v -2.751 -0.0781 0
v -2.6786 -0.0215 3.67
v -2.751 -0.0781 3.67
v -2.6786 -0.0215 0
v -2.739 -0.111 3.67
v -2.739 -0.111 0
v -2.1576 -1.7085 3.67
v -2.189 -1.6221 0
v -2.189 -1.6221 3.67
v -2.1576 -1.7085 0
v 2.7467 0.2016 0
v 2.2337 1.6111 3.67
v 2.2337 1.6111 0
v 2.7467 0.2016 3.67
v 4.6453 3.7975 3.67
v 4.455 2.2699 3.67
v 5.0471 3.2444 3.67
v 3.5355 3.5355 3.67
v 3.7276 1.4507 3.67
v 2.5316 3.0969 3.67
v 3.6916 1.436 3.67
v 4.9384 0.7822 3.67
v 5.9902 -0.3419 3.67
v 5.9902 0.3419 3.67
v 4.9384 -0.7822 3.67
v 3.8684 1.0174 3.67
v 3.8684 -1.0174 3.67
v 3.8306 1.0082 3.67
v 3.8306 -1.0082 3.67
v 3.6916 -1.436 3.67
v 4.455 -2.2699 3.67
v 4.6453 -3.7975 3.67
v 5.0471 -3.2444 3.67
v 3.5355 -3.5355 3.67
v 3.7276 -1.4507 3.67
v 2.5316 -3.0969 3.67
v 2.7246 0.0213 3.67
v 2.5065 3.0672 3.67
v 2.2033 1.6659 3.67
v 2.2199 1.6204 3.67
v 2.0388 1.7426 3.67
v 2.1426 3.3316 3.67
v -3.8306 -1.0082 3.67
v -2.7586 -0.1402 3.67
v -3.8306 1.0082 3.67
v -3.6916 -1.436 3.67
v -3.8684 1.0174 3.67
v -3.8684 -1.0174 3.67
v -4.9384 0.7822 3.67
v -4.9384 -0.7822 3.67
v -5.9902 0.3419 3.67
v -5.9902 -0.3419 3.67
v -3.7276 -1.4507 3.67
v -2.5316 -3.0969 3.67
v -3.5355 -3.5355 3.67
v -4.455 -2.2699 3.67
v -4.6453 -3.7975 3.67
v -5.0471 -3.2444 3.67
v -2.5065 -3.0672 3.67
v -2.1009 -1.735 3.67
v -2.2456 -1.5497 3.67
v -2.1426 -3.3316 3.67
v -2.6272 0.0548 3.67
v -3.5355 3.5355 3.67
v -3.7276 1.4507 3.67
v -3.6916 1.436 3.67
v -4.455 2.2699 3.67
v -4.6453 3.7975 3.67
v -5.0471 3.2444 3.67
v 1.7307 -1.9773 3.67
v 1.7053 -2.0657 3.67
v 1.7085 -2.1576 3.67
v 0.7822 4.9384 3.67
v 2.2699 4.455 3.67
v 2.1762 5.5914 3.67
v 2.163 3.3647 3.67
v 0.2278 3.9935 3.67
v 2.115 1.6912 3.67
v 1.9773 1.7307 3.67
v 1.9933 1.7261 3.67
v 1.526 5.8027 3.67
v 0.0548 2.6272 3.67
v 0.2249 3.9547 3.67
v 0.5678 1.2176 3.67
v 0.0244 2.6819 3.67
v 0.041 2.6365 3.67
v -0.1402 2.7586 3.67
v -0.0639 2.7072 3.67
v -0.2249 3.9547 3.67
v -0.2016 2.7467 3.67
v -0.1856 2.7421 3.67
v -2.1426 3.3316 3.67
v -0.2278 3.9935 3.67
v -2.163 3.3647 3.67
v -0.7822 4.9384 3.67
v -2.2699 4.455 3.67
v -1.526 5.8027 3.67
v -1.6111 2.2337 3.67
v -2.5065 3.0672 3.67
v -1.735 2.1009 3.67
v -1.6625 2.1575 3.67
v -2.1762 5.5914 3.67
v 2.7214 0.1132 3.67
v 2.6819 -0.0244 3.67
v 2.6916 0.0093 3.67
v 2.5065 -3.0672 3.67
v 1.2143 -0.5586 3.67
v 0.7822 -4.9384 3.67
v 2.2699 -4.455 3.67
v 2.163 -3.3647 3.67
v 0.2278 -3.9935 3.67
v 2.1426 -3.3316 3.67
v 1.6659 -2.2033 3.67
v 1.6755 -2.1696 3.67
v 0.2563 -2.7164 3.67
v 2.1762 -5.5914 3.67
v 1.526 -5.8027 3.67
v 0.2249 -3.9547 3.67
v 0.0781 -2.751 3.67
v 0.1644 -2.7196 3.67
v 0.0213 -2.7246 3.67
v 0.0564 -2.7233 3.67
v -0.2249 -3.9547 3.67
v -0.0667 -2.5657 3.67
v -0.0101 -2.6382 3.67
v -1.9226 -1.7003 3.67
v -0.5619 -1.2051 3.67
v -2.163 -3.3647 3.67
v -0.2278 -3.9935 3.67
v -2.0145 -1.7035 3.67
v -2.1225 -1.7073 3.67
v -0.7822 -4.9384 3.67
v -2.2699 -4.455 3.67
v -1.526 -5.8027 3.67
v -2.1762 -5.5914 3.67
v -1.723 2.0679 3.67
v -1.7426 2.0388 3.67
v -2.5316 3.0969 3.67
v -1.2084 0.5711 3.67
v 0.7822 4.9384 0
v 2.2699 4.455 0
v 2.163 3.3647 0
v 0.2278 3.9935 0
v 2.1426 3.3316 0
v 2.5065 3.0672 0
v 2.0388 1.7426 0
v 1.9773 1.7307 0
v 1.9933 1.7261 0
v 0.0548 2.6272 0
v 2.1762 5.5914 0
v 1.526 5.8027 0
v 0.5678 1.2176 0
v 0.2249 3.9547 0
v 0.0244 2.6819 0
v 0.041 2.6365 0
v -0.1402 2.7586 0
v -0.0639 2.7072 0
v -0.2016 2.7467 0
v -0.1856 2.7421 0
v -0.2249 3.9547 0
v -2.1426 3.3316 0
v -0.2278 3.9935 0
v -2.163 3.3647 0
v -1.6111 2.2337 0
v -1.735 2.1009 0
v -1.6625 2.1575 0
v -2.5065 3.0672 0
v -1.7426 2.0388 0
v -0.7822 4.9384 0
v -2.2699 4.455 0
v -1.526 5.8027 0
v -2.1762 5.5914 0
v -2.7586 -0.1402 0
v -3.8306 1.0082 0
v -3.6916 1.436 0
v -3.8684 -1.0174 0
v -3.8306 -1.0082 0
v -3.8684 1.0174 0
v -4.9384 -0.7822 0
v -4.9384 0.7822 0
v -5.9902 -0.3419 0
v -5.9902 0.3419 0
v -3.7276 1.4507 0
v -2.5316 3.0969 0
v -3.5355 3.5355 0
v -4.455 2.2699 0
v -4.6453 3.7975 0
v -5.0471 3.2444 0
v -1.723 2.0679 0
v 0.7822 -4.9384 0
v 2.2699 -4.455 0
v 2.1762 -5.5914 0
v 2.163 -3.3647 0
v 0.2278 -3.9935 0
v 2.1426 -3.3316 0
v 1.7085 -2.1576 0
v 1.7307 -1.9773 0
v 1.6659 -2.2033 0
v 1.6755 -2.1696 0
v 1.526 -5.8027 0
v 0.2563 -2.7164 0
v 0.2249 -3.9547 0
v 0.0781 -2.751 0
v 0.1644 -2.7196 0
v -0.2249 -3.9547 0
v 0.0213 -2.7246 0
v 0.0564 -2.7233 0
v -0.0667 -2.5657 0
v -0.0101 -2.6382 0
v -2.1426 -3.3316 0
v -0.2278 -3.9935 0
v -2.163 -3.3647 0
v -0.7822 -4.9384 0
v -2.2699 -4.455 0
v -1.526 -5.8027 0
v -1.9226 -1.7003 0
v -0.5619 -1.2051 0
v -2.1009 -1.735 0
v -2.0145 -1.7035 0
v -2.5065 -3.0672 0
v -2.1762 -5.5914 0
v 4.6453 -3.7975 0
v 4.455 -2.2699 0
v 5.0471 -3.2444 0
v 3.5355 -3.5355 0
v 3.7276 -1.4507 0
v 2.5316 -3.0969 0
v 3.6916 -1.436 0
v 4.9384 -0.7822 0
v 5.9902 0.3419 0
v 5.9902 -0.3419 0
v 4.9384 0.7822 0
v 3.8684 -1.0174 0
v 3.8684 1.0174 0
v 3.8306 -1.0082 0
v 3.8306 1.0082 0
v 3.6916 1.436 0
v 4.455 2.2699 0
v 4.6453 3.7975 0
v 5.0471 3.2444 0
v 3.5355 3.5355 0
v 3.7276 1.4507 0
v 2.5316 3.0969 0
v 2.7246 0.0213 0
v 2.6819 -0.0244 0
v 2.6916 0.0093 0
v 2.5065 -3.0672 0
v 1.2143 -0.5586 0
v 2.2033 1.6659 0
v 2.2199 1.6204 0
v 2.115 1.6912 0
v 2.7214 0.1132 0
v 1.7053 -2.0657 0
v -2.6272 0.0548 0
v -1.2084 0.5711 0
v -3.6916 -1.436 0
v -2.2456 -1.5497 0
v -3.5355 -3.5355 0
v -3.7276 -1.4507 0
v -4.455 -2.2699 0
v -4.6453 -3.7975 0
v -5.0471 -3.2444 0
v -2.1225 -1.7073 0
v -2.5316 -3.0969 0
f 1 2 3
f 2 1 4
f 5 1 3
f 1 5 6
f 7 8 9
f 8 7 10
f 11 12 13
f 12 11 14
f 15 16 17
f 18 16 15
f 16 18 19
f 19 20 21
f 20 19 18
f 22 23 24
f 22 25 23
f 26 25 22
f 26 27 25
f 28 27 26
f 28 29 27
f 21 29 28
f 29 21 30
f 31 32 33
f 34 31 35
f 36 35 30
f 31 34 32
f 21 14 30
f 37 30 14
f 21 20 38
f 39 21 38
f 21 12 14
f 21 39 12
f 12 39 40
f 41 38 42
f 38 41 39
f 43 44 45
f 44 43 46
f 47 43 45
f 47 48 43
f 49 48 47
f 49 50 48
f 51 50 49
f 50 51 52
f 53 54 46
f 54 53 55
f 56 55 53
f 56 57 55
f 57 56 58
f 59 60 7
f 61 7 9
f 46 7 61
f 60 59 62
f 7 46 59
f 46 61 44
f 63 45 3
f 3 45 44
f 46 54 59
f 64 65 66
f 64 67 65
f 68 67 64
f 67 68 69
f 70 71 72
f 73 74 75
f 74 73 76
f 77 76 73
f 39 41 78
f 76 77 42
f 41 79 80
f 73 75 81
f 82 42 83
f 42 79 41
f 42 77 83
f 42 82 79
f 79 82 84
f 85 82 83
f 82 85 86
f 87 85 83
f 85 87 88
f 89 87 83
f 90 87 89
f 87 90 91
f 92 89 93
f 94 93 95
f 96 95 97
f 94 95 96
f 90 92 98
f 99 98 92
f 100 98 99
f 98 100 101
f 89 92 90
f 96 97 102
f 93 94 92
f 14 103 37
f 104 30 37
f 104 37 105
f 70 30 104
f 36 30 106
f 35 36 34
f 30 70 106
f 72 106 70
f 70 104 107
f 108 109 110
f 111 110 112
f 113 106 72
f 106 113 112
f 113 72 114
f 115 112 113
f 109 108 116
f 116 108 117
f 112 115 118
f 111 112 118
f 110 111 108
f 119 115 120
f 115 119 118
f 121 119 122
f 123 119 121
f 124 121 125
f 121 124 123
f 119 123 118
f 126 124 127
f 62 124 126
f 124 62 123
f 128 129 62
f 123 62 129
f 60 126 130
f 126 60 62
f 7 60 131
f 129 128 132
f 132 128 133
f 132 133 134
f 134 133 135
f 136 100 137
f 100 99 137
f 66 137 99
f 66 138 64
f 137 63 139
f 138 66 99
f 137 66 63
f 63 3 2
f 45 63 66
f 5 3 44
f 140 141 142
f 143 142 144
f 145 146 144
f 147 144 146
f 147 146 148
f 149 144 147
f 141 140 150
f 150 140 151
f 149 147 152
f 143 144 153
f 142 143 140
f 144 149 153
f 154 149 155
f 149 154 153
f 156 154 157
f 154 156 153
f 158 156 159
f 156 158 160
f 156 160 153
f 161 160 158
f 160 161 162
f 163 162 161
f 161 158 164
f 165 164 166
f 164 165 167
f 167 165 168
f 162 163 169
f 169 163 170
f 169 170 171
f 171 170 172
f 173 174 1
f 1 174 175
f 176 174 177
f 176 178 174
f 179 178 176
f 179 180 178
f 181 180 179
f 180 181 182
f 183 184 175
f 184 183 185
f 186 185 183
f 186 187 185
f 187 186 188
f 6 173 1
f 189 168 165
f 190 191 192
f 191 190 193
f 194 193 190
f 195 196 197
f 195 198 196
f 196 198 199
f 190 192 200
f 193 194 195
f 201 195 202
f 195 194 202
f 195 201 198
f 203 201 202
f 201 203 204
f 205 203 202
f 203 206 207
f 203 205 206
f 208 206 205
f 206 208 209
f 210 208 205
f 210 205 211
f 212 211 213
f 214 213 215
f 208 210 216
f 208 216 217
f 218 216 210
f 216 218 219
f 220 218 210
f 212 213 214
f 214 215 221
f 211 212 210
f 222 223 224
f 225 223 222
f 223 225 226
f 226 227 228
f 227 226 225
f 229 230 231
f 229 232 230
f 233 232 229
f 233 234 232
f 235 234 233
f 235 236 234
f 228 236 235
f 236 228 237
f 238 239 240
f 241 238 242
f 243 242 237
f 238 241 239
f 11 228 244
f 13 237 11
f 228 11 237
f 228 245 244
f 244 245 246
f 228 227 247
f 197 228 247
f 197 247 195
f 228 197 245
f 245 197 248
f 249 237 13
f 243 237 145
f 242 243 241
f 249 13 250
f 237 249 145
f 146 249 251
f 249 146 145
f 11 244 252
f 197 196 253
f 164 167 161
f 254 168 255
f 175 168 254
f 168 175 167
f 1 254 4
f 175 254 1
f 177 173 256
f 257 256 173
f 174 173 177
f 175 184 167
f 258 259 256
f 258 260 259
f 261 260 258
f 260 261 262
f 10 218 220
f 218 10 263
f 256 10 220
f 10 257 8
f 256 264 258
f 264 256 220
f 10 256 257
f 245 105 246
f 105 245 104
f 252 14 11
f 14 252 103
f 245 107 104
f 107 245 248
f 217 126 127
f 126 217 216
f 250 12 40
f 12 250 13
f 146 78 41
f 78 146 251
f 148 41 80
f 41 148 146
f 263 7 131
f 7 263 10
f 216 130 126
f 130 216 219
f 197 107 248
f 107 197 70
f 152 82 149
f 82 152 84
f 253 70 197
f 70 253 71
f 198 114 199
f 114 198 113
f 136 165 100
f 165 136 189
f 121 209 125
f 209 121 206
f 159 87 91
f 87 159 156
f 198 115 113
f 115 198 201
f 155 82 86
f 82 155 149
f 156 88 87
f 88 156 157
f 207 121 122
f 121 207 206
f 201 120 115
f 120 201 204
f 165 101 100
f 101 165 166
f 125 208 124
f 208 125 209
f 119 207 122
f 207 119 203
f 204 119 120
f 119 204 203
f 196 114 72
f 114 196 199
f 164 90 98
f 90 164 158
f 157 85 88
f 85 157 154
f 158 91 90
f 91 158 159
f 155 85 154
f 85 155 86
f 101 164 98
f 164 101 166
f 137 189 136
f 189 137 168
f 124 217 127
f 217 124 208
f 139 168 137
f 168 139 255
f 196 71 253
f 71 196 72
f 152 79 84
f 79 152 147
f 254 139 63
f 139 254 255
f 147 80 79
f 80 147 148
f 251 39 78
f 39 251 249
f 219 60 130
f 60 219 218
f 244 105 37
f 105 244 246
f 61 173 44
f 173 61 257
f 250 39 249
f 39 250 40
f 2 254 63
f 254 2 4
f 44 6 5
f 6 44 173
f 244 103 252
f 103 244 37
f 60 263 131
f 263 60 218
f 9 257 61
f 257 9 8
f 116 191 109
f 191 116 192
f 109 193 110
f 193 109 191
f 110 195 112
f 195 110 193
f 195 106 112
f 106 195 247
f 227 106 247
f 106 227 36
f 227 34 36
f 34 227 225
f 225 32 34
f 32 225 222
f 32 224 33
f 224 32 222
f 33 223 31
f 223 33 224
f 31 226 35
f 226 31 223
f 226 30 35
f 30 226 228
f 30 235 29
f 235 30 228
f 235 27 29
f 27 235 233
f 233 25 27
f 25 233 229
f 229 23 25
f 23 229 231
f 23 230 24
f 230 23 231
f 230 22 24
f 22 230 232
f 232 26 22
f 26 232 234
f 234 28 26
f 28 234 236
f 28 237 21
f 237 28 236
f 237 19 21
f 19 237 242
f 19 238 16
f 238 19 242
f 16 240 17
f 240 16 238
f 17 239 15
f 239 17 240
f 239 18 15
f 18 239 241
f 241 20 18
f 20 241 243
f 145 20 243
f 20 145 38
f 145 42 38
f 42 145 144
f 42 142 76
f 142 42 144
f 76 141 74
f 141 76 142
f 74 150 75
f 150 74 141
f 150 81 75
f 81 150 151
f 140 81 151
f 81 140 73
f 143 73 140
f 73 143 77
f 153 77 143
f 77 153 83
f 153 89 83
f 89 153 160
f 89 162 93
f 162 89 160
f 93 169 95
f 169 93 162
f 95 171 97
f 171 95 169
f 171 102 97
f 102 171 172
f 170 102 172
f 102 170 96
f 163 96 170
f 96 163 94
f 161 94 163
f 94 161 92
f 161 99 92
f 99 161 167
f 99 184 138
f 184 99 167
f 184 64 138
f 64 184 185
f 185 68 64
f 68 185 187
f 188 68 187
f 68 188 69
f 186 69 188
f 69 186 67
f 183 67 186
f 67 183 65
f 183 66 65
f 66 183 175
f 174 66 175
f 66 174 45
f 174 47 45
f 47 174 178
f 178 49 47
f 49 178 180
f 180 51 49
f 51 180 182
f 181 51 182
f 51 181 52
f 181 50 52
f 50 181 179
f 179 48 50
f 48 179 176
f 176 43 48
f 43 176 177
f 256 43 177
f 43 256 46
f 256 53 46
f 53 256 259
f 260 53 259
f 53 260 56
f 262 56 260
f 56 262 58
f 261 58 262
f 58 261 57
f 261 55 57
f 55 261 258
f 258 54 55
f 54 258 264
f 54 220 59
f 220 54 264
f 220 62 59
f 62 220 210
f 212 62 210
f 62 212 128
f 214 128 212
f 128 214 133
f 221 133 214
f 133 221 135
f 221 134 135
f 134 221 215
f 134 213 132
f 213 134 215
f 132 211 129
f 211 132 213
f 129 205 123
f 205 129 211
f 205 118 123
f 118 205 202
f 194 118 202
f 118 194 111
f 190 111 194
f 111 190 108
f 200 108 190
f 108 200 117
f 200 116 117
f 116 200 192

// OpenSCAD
// Alorithmic LEGO(r) Technic compatible gear generator
//
// NOTE regarding Patents: Since 1977 the LEGO Group has produced "Technic"
// elements with gear teeth, axles, axle-holes, and other features closely
// resembling the design(s) in this file, as part of their "Expert Builder"
// and "Technical Sets", now called "Technic" (see for example set 961,
// peeron.com/inv/sets/961-1?showpic=9288 ). By 1989 they had added pieces
// with rounded ends (see peeron.com/inv/sets/5264-1?showpic=8542 (set 5264
// from 1987) and peeron.com/inv/sets/5110-2?showpic=8543 (set 5110 from 1989))
// The object(s) produced by this SCAD file are different from real LEGO(r)
// elements, and any similarities of features, such as the shapes of axles
// and axle-holes, are functional in nature. The functions in question
// resemble those in LEGO patents that have already expired (or, if not
// patented, became prior art when the product(s) became available for
// purchase, i.e. 1989 at the latest). Nevertheless, one must not infringe
// on non-expired patents and any non-patent rights, such as LEGO(r)
// trademarks and brand identity. An example of such infringement would be
// to make objects and then try to "pass them off" as LEGO products. See
// for example the Kirkbi AG v. Ritvik Holdings Inc. case, (Supreme Court of
// Canada [2005] 3 S.C.R. 302).
//
// Originally created by user bjepson on Thingiverse (thing 29989)
//
// Expanded by Robert Munafo:
//  20121226: separate parameters for rows/columns of cylinder holes and of
//            "plus-shaped" holes
//          * Rotate the holes by 20 degrees to take advantage of
//            edge dithering both for improved hole width resolution
//            and to provide a rough surface which better grips the
//            smooth axles.
//          * You can now get more than just a single row of plus-holes
//            in each direction
//
//  20130105: added MCAD functions to make this file work all by itself (no
//            need to hunt down missing pieces elsewhere)
//          * More accurate axle hole dimensions
//          * Round holes are actually round now (imagine that!)
//          * Automatically determines correct parameters for number and placement
//            of holes, based on number of teeth

// 32 teeth is the real "missing" gear size, because all the other
// multiples of 8 are available. An argument can also be made for 28 (which
// however is available in the new small turntable) or any other multiple of 4
// because the official gears are all multiples of 4, namely: 8, 12, 16,
// 20, 24, 28(turntable), 36, 40 and 56(big turntable).
//
// For my orrery designs ( see mrob.com/orrery ) I might use any integer
// number of teeth from 8 up to around 60 or 70.
//
// The holes parameters need to be chosen a certain way. To get a normal style
// gear with a + hole in the middle, the plus_row and plus_col should both
// be odd, and the holes_row, holes_col should both be even. To get a round
// hole in the center, do it the other way 'round. Then invoke it as
// myGearParamed(n_teeth, holes_row, holes_col, plus_row, plus_col)
//
// Examples:
//          my 20 gear: holes_row=2, holes_col=2, plus_row=1, plus_col=1
//    Standard 24 gear: holes_row=2, holes_col=2, plus_row=1, plus_col=1
//          my 28 gear: holes_row=2, holes_col=2, plus_row=3, plus_col=1
//          my 32 gear: holes_row=2, holes_col=2, plus_row=3, plus_col=3
// nonstandard 36 gear: holes_row=2, holes_col=2, plus_row=3, plus_col=3
//    Standard 40 gear: holes_row=4, holes_col=2, plus_row=3, plus_col=3
//          my 44 gear: holes_row=4, holes_col=2, plus_row=3, plus_col=3
//          my 48 gear: holes_row=4, holes_col=4, plus_row=5, plus_col=3
//
// By default, the myGear function chooses the best values for all the holes paramters
// based on the number of teeth.

// As an example, make one gear.
myGear(10);

module myGear(n_teeth) {
  if (n_teeth >= 56) {
    myGearParamed(n_teeth, 6, 4, 5, 5);
  } else if (n_teeth >= 48) {
    myGearParamed(n_teeth, 4, 4, 5, 3);
  } else if (n_teeth >= 40) {
    myGearParamed(n_teeth, 4, 2, 3, 3);
  } else if (n_teeth >= 32) {
    myGearParamed(n_teeth, 2, 2, 3, 3);
  } else if (n_teeth >= 26) {
    myGearParamed(n_teeth, 2, 2, 3, 1);
  } else if (n_teeth >= 21) {
    myGearParamed(n_teeth, 2, 2, 1, 1);
  } else {
    myGearParamed(n_teeth, 0, 0, 1, 1);
  }
}

module myGearParamed(num_teeth, holes_row, holes_col, plus_row, plus_col)
{
  jaggy_angle = 20;
  beam_width = 7.8;  // Needs to be a bit less than the LEGO stud spacing = 7.99 mm
  gearHeight = 3.67;

  axle_gap = 1.9;   // axle thickness is actually about 1.8 mm
  hole_radius = 2.65;

  difference() {
    linear_extrude(height = gearHeight, center = false, convexity = 10, twist = 0) {
      gear(number_of_teeth=num_teeth,
        diametral_pitch=1, 
        pressure_angle=88, 
        clearance = 0);
    }

    // We do two rectangular grids of holes, rotate 90 degrees and do them
    // again.
    for (i = [jaggy_angle, jaggy_angle+90]) {
      rotate([0,0,i]) {
        // Cut the cross-axle holes (8.0mm = stud spacing)
        for (x=[-4 * (plus_row - 1 ): 8.0 : 4 * (plus_row -1 )]) {
          for (y=[-4 * (plus_col - 1 ): 8.0 : 4 * (plus_col -1)]) {
            translate([x - hole_radius, y - axle_gap/2, 0])
              #roundedRect([hole_radius * 2, axle_gap, gearHeight], .2);
            translate([x - axle_gap/2, y - hole_radius, 0])
              #roundedRect([axle_gap, hole_radius * 2, gearHeight], .2);
          }
        }

        if (holes_row > 0) {
        // Cut the round holes
        for (x=[-4 * (holes_row-1) : 8.0 : 4 * (holes_row-1)]) {
          for (y=[-4 * (holes_col-1) : 8.0 : 4 * (holes_col-1)]) {
            translate([x, y, 0]) {
              #cylinder(r=hole_radius, h = gearHeight, $fs=0.5);
            }
          }
        }
        }

      }
    }

  }
}


// ---------------------------------------------------------------------------------
//
// module for rounded rectangles by tlrobinson on Thingiverse in a 
// comment posted to http://www.thingiverse.com/thing:9347 on March
// 29, 2012, 3:57:46 AM EDT
//
module roundedRect(size, radius) {  
  x = size[0];  
  y = size[1];  
  z = size[2];  
 
  linear_extrude(height=z)  
  hull() {  
    translate([radius, radius, 0])  
      circle(r=radius);  
 
    translate([x - radius, radius, 0])  
      circle(r=radius);  
 
    translate([x - radius, y - radius, 0])  
      circle(r=radius);  
 
    translate([radius, y - radius, 0])  
      circle(r=radius);  
  }  
}


// ---------------------------------------------------------------------------------
//
// The following functions (gear, involute_gear_tooth and two minor functions)
// are taken from the "gears.scad" file in the "MCAD" package, which is available
// at https://github.com/D1plo1d/MCAD

// Geometry Sources:
//  http://www.cartertools.com/involute.html
//  gears.py (inkscape extension: /usr/share/inkscape/extensions/gears.py)
// Usage:
//  Diametral pitch: Number of teeth per unit length.
//  Circular pitch: Length of the arc from one tooth to the next
//  Clearance: Radial distance between top of tooth on one gear to bottom of gap on another.

module gear(number_of_teeth,
    circular_pitch=false, diametral_pitch=false,
    pressure_angle=20, clearance = 0)
{
  if (circular_pitch==false && diametral_pitch==false) echo("MCAD ERROR: gear module needs either a diametral_pitch or circular_pitch");
  
  //Convert diametrial pitch to our native circular pitch
  circular_pitch = (circular_pitch!=false?circular_pitch:180/diametral_pitch);
  
  // Pitch diameter: Diameter of pitch circle.
  pitch_diameter  =  number_of_teeth * circular_pitch / 180;
  pitch_radius = pitch_diameter/2;
  
  // Base Circle
  base_diameter = pitch_diameter*cos(pressure_angle);
  base_radius = base_diameter/2;

  // Diametrial pitch: Number of teeth per unit length.
  pitch_diametrial = number_of_teeth / pitch_diameter;

  // Addendum: Radial distance from pitch circle to outside circle.
  addendum = 1/pitch_diametrial;
  
  //Outer Circle
  outer_radius = pitch_radius+addendum;
  outer_diameter = outer_radius*2;
  
  // Dedendum: Radial distance from pitch circle to root diameter
  dedendum = addendum + clearance;

  // Root diameter: Diameter of bottom of tooth spaces.
  root_radius = pitch_radius-dedendum;
  root_diameter = root_radius * 2;
  
  half_thick_angle = 360 / (4 * number_of_teeth);
  
  union() {
    rotate(half_thick_angle)
      circle($fn=number_of_teeth*2, r=root_radius*1.001);
    
    for (i= [1:number_of_teeth]) {  //for (i = [0])
      rotate([0,0,i*360/number_of_teeth]) {
        involute_gear_tooth(
          pitch_radius = pitch_radius,
          root_radius = root_radius,
          base_radius = base_radius,
          outer_radius = outer_radius,
          half_thick_angle = half_thick_angle);
      } // end of rotate(){}
    } // end of for(){}
  } // end of union(){}
} // end of module gear

module involute_gear_tooth(
          pitch_radius,
          root_radius,
          base_radius,
          outer_radius,
          half_thick_angle
          )
{
  pitch_to_base_angle  = involute_intersect_angle( base_radius, pitch_radius );
  
  outer_to_base_angle = involute_intersect_angle( base_radius, outer_radius );
  
  base1 = 0 - pitch_to_base_angle - half_thick_angle;
  pitch1 = 0 - half_thick_angle;
  outer1 = outer_to_base_angle - pitch_to_base_angle - half_thick_angle;
  
  b1 = polar_to_cartesian([ base1, base_radius ]);
  p1 = polar_to_cartesian([ pitch1, pitch_radius ]);
  o1 = polar_to_cartesian([ outer1, outer_radius ]);
  
  b2 = polar_to_cartesian([ -base1, base_radius ]);
  p2 = polar_to_cartesian([ -pitch1, pitch_radius ]);
  o2 = polar_to_cartesian([ -outer1, outer_radius ]);
  
  // set up values for ( root_radius > base_radius ) case
    pitch_to_root_angle = pitch_to_base_angle - involute_intersect_angle(base_radius, root_radius );
    root1 = pitch1 - pitch_to_root_angle;
    root2 = -pitch1 + pitch_to_root_angle;
    r1_t =  polar_to_cartesian([ root1, root_radius ]);
    r2_t =  polar_to_cartesian([ -root1, root_radius ]);
  
  // set up values for ( else ) case
    r1_f =  polar_to_cartesian([ base1, root_radius ]);
    r2_f =  polar_to_cartesian([ -base1, root_radius ]);
  
  if (root_radius > base_radius) {
    polygon( points = [
      b1, r1_t,p1,o1,o2,p2,r2_t, b2
    ], convexity = 3);
  } else {
    polygon( points = [
      r1_f, b1,p1,o1,o2,p2,b2,r2_f
    ], convexity = 3);
  }
  
}

// Mathematical Functions
//===============

// Finds the angle of the involute about the base radius at the given distance (radius) from its center.
//source: http://www.mathhelpforum.com/math-help/geometry/136011-circle-involute-solving-y-any-given-x.html

function involute_intersect_angle(base_radius, radius) = sqrt( pow(radius/base_radius,2) - 1);



// Polar coord [angle, radius] to cartesian coord [x,y]

function polar_to_cartesian(polar) = [
  polar[1]*cos(polar[0]),
  polar[1]*sin(polar[0])
];
